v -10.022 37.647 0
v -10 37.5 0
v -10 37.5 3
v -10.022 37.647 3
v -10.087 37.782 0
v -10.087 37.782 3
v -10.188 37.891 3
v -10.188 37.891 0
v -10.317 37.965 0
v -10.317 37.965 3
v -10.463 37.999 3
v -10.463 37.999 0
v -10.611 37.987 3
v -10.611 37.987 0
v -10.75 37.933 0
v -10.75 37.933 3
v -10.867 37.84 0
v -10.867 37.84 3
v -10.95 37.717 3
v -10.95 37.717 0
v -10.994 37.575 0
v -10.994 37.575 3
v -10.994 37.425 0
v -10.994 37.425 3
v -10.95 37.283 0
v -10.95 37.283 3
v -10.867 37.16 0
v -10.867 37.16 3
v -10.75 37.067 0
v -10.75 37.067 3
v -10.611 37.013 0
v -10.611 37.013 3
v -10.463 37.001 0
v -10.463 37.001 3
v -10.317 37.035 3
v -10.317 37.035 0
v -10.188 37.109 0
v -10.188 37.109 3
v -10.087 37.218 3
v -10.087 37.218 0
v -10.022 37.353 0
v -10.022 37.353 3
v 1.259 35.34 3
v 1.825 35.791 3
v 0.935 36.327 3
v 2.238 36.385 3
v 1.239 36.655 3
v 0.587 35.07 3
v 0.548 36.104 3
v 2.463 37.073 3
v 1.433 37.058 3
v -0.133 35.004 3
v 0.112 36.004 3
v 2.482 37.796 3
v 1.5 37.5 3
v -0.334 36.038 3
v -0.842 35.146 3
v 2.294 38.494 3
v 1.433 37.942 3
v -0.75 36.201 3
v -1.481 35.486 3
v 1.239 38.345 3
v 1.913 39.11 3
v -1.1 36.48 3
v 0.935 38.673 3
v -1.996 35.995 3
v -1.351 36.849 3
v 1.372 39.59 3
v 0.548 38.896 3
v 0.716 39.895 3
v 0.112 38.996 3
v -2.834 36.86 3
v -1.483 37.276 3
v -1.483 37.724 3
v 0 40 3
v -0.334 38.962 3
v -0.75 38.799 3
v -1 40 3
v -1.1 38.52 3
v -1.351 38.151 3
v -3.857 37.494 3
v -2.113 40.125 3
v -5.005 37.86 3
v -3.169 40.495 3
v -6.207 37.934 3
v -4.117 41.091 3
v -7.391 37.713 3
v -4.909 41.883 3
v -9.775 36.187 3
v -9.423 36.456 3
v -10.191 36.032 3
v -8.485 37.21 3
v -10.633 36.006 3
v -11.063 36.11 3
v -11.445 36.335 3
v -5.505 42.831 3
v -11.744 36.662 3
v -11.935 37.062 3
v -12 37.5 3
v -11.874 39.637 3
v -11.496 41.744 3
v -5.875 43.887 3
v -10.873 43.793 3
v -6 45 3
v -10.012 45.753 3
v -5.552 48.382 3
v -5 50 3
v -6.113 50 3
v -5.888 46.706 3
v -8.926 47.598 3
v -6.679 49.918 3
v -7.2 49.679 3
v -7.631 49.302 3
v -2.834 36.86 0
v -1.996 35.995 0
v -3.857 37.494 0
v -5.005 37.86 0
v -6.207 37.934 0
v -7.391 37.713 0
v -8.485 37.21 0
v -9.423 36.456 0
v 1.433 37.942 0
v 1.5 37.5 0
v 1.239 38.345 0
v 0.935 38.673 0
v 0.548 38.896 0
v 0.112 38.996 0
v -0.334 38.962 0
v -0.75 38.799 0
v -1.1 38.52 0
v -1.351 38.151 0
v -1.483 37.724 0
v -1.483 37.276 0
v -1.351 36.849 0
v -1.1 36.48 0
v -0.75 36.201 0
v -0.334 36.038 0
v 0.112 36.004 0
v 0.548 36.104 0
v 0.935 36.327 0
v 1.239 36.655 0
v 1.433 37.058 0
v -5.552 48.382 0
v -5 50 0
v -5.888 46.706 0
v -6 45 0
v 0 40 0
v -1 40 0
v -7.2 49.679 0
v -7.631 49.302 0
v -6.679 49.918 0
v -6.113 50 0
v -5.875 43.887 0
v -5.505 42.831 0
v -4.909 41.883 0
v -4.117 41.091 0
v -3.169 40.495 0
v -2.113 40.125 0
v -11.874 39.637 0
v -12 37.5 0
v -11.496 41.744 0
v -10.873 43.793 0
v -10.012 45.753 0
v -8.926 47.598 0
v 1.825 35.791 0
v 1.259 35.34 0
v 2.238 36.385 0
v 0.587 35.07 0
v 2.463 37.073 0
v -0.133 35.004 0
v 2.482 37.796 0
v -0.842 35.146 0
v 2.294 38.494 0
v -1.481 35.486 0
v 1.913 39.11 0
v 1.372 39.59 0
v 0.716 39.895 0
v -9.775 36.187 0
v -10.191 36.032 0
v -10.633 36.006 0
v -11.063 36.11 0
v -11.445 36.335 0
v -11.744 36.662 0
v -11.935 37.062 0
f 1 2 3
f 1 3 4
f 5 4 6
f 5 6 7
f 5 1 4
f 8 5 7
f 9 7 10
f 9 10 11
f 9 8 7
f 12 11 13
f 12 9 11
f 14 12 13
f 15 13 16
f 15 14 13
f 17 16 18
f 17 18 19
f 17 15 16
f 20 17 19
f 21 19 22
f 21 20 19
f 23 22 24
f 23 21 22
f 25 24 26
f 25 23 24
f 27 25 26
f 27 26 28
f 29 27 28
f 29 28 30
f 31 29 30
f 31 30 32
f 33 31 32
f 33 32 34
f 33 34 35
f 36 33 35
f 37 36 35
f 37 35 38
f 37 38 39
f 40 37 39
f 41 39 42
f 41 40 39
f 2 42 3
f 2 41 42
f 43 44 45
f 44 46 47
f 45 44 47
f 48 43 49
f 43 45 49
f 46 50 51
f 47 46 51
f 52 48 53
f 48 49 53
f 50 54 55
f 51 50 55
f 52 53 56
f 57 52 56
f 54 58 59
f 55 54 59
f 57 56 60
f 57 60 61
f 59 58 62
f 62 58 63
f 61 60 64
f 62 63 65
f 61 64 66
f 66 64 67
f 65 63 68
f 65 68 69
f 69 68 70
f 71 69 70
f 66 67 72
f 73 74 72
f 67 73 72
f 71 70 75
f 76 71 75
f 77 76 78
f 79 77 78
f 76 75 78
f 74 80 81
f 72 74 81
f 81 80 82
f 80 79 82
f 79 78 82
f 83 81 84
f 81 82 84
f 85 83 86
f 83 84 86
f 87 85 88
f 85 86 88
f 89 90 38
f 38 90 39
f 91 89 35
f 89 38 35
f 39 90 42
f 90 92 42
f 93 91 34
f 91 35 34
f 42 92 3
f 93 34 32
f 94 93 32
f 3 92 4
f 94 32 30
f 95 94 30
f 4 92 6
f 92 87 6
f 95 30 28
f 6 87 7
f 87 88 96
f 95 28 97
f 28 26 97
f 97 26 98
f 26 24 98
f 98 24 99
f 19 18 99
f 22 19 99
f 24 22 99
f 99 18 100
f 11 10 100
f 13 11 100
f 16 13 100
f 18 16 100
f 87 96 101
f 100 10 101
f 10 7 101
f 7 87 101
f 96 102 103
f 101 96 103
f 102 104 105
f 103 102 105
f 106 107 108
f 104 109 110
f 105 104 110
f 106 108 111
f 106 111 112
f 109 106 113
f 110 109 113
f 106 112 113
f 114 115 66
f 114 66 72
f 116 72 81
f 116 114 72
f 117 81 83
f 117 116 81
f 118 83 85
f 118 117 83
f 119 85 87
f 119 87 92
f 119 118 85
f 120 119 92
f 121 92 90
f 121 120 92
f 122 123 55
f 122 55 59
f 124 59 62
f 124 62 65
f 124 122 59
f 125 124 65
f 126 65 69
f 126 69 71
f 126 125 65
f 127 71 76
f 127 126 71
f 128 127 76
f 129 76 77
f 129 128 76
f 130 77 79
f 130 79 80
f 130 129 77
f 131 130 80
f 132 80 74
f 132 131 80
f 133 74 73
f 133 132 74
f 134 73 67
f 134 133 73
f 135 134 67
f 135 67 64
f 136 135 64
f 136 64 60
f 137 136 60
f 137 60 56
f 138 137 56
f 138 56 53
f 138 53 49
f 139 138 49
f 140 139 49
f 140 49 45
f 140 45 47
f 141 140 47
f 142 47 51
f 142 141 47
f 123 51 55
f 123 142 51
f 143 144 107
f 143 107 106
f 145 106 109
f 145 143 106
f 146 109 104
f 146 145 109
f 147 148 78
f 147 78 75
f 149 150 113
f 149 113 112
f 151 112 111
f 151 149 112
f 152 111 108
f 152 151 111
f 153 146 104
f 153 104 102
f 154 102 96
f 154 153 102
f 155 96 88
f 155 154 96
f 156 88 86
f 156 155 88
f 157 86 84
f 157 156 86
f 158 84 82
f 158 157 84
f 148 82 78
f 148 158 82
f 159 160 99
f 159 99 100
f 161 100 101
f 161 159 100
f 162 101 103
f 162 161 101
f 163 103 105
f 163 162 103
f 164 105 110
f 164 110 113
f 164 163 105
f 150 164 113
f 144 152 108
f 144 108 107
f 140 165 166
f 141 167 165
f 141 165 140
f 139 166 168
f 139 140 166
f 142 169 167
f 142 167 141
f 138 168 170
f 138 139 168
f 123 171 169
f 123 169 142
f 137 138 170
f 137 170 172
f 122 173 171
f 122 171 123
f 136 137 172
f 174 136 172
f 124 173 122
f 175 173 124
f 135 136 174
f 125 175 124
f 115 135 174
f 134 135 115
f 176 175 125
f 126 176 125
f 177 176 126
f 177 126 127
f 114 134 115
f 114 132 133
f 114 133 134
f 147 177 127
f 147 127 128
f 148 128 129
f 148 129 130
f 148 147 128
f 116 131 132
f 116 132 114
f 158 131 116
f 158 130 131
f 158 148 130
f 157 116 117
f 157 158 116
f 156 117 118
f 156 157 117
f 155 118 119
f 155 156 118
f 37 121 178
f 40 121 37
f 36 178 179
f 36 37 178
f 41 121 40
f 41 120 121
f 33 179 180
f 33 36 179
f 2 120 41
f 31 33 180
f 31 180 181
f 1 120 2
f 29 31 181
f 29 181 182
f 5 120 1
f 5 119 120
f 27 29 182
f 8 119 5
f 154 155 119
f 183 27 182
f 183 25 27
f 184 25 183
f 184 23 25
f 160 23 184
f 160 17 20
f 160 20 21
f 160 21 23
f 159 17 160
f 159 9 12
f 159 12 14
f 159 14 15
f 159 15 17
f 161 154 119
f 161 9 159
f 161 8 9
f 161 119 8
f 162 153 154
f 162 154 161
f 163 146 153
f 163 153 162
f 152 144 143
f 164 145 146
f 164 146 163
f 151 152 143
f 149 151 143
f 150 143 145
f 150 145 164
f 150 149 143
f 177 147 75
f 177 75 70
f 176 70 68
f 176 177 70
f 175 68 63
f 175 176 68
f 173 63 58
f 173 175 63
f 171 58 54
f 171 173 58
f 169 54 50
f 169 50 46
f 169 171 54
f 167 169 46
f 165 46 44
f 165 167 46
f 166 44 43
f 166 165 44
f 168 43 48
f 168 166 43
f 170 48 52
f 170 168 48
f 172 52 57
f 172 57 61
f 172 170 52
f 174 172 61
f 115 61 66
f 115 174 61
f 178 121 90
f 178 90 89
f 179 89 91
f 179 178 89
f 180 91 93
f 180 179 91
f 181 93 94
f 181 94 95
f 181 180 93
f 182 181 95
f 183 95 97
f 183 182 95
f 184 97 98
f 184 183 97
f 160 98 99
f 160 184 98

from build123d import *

# Parameters (mm, degrees)
CROQUIS2_R              = 1.5
CROQUIS2_R_2            = 0.5
SALIENTE_EXTRUIR1_DEPTH = 3


with BuildPart() as part:
    # Croquis2 → Saliente-Extruir1 (new body)
    with BuildSketch(Plane.XY):
        with BuildLine():
            Line((-1, 40), (0, 40))
            ThreePointArc((0, 40), (2.237600264, 36.385035848), (-1.995875264, 35.994516047))
            ThreePointArc((-1.995875264, 35.994516047), (-5.603547267, 37.933990418), (-9.423373519, 36.455550183))
            ThreePointArc((-9.423373519, 36.455550183), (-11.063498127, 36.109866963), (-12, 37.5))
            ThreePointArc((-12, 37.5), (-10.872626967, 43.792559296), (-7.630752828, 49.302325581))
            ThreePointArc((-7.630752828, 49.302325581), (-6.948145724, 49.817230195), (-6.112876654, 50))
            Line((-6.112876654, 50), (-5, 50))
            ThreePointArc((-5, 50), (-5.747548784, 47.549509757), (-6, 45))
            ThreePointArc((-6, 45), (-4.535533906, 41.464466094), (-1, 40))
        make_face()
        with Locations((0, 37.5)):
            Circle(CROQUIS2_R, mode=Mode.SUBTRACT)
        with Locations((-10.5, 37.5)):
            Circle(CROQUIS2_R_2, mode=Mode.SUBTRACT)
    extrude(amount=SALIENTE_EXTRUIR1_DEPTH)


solid = part.part
